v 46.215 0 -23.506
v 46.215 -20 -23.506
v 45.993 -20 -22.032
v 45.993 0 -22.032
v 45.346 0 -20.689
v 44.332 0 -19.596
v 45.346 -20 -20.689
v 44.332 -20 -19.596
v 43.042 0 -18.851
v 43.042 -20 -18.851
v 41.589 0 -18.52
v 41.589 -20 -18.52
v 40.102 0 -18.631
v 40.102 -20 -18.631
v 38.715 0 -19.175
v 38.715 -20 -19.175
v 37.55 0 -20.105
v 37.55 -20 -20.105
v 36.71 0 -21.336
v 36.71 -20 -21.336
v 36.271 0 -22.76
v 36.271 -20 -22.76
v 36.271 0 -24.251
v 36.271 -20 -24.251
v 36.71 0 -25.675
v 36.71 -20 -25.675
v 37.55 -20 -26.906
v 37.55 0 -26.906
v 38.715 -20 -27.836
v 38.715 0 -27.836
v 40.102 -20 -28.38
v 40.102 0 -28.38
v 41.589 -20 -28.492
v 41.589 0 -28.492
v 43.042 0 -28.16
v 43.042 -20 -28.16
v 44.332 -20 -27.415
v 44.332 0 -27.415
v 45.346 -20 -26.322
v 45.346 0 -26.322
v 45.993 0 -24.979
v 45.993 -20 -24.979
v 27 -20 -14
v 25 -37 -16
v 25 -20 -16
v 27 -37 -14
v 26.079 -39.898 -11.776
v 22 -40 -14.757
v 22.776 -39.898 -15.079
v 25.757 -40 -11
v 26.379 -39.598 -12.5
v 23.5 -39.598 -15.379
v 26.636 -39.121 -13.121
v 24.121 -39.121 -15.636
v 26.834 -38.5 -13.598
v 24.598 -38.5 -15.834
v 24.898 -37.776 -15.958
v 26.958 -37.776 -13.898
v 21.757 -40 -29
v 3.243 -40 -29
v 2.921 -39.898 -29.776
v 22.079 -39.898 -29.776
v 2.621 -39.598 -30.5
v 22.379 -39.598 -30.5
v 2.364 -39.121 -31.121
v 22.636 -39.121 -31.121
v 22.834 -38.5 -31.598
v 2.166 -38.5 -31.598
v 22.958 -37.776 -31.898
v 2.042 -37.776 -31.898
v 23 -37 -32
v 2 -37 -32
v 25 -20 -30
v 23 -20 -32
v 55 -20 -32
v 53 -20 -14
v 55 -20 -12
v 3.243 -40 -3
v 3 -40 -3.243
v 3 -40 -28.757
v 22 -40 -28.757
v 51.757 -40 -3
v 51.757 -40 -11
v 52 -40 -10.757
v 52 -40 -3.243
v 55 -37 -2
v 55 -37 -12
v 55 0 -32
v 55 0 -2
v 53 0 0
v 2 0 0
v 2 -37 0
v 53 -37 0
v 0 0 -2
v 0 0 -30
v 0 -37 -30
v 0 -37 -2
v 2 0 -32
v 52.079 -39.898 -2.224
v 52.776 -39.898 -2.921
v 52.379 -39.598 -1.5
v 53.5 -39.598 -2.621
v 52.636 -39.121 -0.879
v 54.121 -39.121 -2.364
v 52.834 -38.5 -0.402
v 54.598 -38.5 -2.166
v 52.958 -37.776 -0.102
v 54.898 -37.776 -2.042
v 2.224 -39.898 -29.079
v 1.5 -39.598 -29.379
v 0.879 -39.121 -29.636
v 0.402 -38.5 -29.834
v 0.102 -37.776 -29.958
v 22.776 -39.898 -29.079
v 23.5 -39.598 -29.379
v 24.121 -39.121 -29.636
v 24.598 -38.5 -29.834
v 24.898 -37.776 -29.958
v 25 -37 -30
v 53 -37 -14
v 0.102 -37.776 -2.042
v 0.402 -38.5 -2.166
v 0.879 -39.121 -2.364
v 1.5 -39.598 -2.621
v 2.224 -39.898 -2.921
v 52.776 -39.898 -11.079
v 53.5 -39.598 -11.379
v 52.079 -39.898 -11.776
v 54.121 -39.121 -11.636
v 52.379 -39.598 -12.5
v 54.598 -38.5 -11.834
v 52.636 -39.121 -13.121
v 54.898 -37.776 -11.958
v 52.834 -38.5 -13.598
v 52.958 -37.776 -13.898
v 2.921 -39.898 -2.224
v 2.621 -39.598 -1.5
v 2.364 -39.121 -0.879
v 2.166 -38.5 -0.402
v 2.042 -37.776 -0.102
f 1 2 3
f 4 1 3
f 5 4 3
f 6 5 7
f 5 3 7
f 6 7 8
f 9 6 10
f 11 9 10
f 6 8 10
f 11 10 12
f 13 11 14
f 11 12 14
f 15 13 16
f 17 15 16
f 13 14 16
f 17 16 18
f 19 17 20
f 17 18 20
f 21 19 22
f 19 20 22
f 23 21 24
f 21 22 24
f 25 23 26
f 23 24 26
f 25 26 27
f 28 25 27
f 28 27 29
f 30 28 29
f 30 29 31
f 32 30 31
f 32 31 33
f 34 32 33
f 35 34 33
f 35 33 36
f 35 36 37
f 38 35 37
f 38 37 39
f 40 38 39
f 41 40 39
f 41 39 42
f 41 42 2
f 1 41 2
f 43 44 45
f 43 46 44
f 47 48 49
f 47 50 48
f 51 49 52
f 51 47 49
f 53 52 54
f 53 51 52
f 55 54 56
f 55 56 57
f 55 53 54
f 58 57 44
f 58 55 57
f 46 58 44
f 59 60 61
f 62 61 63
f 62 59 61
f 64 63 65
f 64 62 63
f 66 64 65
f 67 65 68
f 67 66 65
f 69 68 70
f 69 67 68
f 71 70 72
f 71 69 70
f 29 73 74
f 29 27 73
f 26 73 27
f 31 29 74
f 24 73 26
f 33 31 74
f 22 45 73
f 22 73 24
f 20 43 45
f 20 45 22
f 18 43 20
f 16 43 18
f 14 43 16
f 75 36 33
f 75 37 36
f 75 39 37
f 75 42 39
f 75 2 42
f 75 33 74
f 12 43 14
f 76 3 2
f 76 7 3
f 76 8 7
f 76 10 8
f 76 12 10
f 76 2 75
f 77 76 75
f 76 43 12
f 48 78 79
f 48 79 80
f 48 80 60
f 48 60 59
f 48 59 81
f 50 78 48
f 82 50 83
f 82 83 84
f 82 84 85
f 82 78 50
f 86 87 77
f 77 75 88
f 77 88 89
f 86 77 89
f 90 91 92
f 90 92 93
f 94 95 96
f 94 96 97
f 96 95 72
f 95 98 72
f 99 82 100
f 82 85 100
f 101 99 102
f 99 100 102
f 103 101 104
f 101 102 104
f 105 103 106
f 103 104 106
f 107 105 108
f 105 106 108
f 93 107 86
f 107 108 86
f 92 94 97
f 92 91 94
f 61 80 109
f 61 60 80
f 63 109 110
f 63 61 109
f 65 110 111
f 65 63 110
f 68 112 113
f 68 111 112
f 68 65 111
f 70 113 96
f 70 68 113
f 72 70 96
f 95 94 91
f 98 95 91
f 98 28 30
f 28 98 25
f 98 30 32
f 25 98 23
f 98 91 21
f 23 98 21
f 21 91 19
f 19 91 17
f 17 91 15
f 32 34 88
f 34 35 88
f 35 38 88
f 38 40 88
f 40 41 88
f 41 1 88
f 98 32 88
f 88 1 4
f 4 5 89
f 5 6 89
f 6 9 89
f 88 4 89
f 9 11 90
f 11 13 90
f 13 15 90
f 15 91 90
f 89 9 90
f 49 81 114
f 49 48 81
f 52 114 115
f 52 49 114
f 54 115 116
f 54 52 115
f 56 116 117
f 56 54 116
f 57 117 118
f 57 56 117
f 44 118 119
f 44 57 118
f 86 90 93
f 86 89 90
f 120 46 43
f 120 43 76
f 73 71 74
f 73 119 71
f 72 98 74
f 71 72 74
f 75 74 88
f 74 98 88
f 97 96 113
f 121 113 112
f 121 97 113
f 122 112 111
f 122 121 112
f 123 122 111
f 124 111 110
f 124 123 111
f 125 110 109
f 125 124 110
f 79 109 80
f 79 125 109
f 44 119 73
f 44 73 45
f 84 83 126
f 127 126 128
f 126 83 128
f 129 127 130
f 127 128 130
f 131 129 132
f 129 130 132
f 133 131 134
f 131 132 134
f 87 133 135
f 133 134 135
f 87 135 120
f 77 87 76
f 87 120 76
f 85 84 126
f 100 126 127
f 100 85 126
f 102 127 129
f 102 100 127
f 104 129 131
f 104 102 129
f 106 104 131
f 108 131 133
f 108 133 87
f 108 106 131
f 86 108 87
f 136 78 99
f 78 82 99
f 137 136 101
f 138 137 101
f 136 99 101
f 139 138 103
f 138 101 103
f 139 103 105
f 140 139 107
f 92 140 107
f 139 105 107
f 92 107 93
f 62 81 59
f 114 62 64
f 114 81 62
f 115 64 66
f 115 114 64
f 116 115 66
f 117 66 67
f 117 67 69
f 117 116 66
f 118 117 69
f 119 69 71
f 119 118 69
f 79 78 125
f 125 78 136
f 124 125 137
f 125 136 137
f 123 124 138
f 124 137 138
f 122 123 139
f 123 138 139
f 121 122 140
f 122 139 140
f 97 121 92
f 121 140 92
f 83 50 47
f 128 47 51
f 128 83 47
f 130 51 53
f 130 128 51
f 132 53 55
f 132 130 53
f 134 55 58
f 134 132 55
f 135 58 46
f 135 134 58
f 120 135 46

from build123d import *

# Parameters (mm, degrees)
F0_W     = 55
F0_H     = 32
F1_DEPTH = 40
F2_W     = 30
F2_H     = 18
F3_DEPTH = 20
F4_R     = 5
F5_DEPTH = 20.001
F6_SIZE  = 2
F7_R     = 3


with BuildPart() as f1:
    # F0 (on Front) → F1 (new body)
    with BuildSketch(Plane.XZ):
        with Locations((27.5, -16)):
            Rectangle(F0_W, F0_H)
    extrude(amount=F1_DEPTH)

    # F2 (on face) → F3 (cut)
    with BuildSketch(Plane.XZ.offset(40)):
        with Locations((40, -23)):
            Rectangle(F2_W, F2_H)
    extrude(amount=-F3_DEPTH, mode=Mode.SUBTRACT)

    # F4 (on face) → F5 (cut, through all)
    with BuildSketch(Plane.XZ.offset(20)):
        with Locations((41.2149988763, -23.5055347287)):
            Circle(F4_R)
    extrude(amount=-F5_DEPTH, mode=Mode.SUBTRACT)

    # F6
    f6_edges = [f1.edges().sort_by_distance(p)[0] for p in [
        (0, -20, -32),
        (25, -30, -32),
        (25, -30, -14),
        (55, -20, 0),
        (55, -30, -14),
        (0, -20, 0),
    ]]
    chamfer(f6_edges, length=F6_SIZE)

    # F7
    f7_edges = [f1.edges().sort_by_distance(p)[0] for p in [
        (25, -40, -23),
        (24, -40, -31),
        (12.5, -40, -32),
        (0, -40, -16),
        (55, -40, -7),
        (54, -40, -13),
        (54, -40, -1),
        (40, -40, -14),
        (27.5, -40, 0),
        (26, -40, -15),
        (1, -40, -1),
        (1, -40, -31),
    ]]
    fillet(f7_edges, radius=F7_R)


solid = f1.part
